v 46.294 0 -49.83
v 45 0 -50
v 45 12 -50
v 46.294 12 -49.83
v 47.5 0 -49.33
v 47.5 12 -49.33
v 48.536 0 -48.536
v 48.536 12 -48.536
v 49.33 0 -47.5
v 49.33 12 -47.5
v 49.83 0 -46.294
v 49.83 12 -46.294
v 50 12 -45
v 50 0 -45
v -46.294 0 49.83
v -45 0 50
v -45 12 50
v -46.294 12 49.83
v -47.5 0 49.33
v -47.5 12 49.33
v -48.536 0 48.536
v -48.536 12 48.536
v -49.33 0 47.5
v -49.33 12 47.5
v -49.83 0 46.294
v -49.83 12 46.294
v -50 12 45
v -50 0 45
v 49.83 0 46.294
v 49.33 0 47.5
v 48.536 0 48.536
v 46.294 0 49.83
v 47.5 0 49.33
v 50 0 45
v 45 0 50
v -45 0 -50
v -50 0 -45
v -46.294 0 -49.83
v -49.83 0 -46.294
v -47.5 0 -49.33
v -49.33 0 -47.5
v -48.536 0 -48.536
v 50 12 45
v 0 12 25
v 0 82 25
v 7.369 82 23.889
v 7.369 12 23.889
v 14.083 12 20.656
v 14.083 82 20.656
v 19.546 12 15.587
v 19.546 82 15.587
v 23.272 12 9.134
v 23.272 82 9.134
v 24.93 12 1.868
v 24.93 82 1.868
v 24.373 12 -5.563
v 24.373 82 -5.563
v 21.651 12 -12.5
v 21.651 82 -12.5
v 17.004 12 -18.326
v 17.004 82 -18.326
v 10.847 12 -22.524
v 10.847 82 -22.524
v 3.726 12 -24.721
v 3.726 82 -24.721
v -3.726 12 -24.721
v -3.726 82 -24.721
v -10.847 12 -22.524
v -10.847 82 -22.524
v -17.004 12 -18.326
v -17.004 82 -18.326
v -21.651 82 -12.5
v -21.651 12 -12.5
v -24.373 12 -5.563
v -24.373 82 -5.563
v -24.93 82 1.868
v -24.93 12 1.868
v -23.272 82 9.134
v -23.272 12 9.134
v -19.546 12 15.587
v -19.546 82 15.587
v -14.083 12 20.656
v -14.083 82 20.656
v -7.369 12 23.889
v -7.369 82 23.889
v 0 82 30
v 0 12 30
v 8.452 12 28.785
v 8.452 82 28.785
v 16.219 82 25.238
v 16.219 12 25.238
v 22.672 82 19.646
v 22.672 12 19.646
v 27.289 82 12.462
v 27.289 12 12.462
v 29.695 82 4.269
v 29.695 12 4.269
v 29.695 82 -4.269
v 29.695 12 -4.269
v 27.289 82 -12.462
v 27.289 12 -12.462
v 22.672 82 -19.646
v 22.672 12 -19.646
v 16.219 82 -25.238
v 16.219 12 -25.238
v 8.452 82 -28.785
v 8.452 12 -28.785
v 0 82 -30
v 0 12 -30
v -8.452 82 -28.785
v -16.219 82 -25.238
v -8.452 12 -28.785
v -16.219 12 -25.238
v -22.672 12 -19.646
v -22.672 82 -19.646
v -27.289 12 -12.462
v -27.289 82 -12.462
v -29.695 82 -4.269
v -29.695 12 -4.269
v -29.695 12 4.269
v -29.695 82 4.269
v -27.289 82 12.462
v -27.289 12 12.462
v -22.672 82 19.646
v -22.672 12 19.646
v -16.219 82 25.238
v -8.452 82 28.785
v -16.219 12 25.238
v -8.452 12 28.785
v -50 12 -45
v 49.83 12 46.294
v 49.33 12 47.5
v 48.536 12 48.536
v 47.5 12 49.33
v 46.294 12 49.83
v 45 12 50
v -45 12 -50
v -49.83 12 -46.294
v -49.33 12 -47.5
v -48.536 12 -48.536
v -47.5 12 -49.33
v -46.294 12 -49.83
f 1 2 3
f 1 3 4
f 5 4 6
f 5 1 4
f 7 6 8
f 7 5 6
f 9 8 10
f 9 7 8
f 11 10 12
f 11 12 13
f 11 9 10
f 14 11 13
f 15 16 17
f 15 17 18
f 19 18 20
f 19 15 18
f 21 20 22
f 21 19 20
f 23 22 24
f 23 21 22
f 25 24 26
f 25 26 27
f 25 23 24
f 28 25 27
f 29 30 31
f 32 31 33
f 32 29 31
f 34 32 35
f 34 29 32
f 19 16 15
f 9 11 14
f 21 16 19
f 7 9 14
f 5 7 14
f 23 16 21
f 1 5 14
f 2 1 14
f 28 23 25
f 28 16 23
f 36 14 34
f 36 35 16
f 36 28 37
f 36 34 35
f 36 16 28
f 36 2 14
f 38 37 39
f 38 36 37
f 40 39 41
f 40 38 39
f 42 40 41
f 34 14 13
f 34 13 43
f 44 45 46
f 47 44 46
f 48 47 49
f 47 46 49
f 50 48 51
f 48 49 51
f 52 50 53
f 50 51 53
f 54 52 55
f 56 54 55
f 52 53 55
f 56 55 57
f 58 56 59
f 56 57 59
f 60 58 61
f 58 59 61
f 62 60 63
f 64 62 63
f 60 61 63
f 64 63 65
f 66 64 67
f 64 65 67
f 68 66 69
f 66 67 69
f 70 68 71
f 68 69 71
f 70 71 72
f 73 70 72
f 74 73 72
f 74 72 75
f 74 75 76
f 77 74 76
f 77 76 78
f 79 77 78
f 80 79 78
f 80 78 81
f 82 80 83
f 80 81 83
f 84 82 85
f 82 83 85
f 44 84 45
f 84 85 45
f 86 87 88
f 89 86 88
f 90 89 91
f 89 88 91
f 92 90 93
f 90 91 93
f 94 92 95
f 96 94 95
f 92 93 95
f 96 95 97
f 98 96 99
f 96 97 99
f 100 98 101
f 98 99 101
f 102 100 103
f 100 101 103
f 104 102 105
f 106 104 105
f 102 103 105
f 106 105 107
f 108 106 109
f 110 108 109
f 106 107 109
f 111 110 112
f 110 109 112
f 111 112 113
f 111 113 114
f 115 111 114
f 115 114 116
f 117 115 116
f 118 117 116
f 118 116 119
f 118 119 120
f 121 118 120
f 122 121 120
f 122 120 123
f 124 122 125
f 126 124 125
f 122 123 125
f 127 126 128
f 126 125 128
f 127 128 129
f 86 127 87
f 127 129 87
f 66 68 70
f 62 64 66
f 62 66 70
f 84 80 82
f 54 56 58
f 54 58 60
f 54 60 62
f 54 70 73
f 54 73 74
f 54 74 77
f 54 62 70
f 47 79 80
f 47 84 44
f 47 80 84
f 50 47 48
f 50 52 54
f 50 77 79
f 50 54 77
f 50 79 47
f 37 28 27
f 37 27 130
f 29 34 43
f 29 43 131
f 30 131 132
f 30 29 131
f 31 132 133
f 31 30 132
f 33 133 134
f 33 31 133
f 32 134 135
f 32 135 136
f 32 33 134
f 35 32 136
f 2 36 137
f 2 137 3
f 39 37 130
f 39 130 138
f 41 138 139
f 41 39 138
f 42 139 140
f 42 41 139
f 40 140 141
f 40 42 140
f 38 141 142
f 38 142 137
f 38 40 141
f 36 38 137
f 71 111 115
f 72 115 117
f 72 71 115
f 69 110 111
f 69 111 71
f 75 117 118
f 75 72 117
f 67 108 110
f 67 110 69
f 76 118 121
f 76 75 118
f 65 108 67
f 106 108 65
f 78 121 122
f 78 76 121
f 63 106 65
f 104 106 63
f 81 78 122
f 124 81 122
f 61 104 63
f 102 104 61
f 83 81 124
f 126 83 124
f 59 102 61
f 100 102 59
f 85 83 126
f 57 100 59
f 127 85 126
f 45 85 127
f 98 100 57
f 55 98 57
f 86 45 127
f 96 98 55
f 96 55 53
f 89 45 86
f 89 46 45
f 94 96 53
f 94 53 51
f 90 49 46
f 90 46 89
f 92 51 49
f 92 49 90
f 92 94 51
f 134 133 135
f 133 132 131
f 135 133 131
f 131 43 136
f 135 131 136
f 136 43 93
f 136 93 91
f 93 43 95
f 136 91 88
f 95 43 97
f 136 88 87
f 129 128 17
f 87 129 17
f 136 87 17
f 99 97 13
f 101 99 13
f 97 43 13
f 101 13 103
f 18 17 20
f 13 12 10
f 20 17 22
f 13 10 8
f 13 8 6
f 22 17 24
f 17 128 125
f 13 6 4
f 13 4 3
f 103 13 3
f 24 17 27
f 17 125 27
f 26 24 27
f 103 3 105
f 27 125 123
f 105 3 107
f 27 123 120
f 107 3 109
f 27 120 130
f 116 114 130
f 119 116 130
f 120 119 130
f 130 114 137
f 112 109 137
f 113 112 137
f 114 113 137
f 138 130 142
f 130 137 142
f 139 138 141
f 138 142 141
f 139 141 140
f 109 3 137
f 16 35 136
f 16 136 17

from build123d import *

# Parameters (mm, degrees)
BOSS_EXTRUDE1_DEPTH = 12
SKETCH3_R           = 30
BOSS_EXTRUDE2_DEPTH = 70
SKETCH4_R           = 25
CUT_EXTRUDE1_DEPTH  = 70


with BuildPart() as part:
    # Sketch1 → Boss-Extrude1 (new body)
    with BuildSketch(Plane(origin=(0, 0, 0), x_dir=(1, 0, 0), z_dir=(0, 1, 0))):
        with BuildLine():
            Line((-45, 50), (45, 50))
            ThreePointArc((45, 50), (48.535533906, 48.535533906), (50, 45))
            Line((50, 45), (50, -45))
            ThreePointArc((50, -45), (48.535533906, -48.535533906), (45, -50))
            Line((45, -50), (-45, -50))
            ThreePointArc((-45, -50), (-48.535533906, -48.535533906), (-50, -45))
            Line((-50, -45), (-50, 45))
            ThreePointArc((-50, 45), (-48.535533906, 48.535533906), (-45, 50))
        make_face()
    extrude(amount=BOSS_EXTRUDE1_DEPTH)

    # Sketch3 → Boss-Extrude2 (add)
    with BuildSketch(Plane(origin=(0, 12, 0), x_dir=(1, 0, 0), z_dir=(0, 1, 0))):
        with Locations(Location((0, 0, 0), (0, 0, 270))):
            Circle(SKETCH3_R)
    extrude(amount=BOSS_EXTRUDE2_DEPTH)

    # Sketch4 → Cut-Extrude1 (cut)
    with BuildSketch(Plane(origin=(0, 82, 0), x_dir=(1, 0, 0), z_dir=(0, 1, 0))):
        with Locations(Location((0, 0, 0), (0, 0, 270))):
            Circle(SKETCH4_R)
    extrude(amount=-CUT_EXTRUDE1_DEPTH, mode=Mode.SUBTRACT)


solid = part.part
